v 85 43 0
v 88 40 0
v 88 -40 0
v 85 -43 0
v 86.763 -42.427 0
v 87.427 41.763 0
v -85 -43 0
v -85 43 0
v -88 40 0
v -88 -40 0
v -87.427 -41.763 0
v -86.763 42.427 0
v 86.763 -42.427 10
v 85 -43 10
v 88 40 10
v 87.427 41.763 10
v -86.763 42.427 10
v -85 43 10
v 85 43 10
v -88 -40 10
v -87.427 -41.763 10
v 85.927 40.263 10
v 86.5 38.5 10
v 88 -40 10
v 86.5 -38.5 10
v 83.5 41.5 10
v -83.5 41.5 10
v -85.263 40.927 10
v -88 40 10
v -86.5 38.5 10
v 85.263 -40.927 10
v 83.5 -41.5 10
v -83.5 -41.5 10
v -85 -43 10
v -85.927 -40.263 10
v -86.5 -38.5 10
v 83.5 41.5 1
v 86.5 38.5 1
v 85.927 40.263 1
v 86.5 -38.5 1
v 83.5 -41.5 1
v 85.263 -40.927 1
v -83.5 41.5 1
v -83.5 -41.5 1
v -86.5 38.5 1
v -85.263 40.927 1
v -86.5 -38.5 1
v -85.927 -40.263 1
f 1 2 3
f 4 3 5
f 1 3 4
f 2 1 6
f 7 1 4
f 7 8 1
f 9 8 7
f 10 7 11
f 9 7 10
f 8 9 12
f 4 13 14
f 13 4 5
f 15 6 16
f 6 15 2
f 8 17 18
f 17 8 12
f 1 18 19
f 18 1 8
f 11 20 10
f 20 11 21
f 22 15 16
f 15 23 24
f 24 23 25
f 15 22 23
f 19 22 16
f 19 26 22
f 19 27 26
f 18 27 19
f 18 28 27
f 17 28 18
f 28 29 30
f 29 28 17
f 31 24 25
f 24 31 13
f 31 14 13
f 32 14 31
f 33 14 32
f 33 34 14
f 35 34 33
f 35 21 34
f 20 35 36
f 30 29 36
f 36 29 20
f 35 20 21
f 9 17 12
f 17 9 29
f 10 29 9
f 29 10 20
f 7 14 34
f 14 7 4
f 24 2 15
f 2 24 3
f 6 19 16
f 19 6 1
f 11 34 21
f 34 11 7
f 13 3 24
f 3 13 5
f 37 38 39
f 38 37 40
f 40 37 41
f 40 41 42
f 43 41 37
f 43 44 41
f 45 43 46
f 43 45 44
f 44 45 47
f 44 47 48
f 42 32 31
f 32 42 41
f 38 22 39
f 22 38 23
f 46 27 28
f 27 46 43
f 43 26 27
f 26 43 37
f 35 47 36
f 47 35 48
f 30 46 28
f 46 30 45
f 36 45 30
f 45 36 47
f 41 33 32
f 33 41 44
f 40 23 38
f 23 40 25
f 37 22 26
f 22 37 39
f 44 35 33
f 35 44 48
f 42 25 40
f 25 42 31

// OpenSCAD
difference(){
linear_extrude(10)
offset(3)
square([170,80],center=true);
translate([0,0,1])
linear_extrude(10)
offset(3)
square([170-3,80-3],center=true);
}
/*
translate([0,95,0])
difference(){
linear_extrude(3)
offset(3)
square([170+2.5*2,80+2.5*2],center=true);
translate([0,0,1])
linear_extrude(10)
offset(3)
square([170-3+2.5*2,80-3+2.5*2],center=true);
}
*/
